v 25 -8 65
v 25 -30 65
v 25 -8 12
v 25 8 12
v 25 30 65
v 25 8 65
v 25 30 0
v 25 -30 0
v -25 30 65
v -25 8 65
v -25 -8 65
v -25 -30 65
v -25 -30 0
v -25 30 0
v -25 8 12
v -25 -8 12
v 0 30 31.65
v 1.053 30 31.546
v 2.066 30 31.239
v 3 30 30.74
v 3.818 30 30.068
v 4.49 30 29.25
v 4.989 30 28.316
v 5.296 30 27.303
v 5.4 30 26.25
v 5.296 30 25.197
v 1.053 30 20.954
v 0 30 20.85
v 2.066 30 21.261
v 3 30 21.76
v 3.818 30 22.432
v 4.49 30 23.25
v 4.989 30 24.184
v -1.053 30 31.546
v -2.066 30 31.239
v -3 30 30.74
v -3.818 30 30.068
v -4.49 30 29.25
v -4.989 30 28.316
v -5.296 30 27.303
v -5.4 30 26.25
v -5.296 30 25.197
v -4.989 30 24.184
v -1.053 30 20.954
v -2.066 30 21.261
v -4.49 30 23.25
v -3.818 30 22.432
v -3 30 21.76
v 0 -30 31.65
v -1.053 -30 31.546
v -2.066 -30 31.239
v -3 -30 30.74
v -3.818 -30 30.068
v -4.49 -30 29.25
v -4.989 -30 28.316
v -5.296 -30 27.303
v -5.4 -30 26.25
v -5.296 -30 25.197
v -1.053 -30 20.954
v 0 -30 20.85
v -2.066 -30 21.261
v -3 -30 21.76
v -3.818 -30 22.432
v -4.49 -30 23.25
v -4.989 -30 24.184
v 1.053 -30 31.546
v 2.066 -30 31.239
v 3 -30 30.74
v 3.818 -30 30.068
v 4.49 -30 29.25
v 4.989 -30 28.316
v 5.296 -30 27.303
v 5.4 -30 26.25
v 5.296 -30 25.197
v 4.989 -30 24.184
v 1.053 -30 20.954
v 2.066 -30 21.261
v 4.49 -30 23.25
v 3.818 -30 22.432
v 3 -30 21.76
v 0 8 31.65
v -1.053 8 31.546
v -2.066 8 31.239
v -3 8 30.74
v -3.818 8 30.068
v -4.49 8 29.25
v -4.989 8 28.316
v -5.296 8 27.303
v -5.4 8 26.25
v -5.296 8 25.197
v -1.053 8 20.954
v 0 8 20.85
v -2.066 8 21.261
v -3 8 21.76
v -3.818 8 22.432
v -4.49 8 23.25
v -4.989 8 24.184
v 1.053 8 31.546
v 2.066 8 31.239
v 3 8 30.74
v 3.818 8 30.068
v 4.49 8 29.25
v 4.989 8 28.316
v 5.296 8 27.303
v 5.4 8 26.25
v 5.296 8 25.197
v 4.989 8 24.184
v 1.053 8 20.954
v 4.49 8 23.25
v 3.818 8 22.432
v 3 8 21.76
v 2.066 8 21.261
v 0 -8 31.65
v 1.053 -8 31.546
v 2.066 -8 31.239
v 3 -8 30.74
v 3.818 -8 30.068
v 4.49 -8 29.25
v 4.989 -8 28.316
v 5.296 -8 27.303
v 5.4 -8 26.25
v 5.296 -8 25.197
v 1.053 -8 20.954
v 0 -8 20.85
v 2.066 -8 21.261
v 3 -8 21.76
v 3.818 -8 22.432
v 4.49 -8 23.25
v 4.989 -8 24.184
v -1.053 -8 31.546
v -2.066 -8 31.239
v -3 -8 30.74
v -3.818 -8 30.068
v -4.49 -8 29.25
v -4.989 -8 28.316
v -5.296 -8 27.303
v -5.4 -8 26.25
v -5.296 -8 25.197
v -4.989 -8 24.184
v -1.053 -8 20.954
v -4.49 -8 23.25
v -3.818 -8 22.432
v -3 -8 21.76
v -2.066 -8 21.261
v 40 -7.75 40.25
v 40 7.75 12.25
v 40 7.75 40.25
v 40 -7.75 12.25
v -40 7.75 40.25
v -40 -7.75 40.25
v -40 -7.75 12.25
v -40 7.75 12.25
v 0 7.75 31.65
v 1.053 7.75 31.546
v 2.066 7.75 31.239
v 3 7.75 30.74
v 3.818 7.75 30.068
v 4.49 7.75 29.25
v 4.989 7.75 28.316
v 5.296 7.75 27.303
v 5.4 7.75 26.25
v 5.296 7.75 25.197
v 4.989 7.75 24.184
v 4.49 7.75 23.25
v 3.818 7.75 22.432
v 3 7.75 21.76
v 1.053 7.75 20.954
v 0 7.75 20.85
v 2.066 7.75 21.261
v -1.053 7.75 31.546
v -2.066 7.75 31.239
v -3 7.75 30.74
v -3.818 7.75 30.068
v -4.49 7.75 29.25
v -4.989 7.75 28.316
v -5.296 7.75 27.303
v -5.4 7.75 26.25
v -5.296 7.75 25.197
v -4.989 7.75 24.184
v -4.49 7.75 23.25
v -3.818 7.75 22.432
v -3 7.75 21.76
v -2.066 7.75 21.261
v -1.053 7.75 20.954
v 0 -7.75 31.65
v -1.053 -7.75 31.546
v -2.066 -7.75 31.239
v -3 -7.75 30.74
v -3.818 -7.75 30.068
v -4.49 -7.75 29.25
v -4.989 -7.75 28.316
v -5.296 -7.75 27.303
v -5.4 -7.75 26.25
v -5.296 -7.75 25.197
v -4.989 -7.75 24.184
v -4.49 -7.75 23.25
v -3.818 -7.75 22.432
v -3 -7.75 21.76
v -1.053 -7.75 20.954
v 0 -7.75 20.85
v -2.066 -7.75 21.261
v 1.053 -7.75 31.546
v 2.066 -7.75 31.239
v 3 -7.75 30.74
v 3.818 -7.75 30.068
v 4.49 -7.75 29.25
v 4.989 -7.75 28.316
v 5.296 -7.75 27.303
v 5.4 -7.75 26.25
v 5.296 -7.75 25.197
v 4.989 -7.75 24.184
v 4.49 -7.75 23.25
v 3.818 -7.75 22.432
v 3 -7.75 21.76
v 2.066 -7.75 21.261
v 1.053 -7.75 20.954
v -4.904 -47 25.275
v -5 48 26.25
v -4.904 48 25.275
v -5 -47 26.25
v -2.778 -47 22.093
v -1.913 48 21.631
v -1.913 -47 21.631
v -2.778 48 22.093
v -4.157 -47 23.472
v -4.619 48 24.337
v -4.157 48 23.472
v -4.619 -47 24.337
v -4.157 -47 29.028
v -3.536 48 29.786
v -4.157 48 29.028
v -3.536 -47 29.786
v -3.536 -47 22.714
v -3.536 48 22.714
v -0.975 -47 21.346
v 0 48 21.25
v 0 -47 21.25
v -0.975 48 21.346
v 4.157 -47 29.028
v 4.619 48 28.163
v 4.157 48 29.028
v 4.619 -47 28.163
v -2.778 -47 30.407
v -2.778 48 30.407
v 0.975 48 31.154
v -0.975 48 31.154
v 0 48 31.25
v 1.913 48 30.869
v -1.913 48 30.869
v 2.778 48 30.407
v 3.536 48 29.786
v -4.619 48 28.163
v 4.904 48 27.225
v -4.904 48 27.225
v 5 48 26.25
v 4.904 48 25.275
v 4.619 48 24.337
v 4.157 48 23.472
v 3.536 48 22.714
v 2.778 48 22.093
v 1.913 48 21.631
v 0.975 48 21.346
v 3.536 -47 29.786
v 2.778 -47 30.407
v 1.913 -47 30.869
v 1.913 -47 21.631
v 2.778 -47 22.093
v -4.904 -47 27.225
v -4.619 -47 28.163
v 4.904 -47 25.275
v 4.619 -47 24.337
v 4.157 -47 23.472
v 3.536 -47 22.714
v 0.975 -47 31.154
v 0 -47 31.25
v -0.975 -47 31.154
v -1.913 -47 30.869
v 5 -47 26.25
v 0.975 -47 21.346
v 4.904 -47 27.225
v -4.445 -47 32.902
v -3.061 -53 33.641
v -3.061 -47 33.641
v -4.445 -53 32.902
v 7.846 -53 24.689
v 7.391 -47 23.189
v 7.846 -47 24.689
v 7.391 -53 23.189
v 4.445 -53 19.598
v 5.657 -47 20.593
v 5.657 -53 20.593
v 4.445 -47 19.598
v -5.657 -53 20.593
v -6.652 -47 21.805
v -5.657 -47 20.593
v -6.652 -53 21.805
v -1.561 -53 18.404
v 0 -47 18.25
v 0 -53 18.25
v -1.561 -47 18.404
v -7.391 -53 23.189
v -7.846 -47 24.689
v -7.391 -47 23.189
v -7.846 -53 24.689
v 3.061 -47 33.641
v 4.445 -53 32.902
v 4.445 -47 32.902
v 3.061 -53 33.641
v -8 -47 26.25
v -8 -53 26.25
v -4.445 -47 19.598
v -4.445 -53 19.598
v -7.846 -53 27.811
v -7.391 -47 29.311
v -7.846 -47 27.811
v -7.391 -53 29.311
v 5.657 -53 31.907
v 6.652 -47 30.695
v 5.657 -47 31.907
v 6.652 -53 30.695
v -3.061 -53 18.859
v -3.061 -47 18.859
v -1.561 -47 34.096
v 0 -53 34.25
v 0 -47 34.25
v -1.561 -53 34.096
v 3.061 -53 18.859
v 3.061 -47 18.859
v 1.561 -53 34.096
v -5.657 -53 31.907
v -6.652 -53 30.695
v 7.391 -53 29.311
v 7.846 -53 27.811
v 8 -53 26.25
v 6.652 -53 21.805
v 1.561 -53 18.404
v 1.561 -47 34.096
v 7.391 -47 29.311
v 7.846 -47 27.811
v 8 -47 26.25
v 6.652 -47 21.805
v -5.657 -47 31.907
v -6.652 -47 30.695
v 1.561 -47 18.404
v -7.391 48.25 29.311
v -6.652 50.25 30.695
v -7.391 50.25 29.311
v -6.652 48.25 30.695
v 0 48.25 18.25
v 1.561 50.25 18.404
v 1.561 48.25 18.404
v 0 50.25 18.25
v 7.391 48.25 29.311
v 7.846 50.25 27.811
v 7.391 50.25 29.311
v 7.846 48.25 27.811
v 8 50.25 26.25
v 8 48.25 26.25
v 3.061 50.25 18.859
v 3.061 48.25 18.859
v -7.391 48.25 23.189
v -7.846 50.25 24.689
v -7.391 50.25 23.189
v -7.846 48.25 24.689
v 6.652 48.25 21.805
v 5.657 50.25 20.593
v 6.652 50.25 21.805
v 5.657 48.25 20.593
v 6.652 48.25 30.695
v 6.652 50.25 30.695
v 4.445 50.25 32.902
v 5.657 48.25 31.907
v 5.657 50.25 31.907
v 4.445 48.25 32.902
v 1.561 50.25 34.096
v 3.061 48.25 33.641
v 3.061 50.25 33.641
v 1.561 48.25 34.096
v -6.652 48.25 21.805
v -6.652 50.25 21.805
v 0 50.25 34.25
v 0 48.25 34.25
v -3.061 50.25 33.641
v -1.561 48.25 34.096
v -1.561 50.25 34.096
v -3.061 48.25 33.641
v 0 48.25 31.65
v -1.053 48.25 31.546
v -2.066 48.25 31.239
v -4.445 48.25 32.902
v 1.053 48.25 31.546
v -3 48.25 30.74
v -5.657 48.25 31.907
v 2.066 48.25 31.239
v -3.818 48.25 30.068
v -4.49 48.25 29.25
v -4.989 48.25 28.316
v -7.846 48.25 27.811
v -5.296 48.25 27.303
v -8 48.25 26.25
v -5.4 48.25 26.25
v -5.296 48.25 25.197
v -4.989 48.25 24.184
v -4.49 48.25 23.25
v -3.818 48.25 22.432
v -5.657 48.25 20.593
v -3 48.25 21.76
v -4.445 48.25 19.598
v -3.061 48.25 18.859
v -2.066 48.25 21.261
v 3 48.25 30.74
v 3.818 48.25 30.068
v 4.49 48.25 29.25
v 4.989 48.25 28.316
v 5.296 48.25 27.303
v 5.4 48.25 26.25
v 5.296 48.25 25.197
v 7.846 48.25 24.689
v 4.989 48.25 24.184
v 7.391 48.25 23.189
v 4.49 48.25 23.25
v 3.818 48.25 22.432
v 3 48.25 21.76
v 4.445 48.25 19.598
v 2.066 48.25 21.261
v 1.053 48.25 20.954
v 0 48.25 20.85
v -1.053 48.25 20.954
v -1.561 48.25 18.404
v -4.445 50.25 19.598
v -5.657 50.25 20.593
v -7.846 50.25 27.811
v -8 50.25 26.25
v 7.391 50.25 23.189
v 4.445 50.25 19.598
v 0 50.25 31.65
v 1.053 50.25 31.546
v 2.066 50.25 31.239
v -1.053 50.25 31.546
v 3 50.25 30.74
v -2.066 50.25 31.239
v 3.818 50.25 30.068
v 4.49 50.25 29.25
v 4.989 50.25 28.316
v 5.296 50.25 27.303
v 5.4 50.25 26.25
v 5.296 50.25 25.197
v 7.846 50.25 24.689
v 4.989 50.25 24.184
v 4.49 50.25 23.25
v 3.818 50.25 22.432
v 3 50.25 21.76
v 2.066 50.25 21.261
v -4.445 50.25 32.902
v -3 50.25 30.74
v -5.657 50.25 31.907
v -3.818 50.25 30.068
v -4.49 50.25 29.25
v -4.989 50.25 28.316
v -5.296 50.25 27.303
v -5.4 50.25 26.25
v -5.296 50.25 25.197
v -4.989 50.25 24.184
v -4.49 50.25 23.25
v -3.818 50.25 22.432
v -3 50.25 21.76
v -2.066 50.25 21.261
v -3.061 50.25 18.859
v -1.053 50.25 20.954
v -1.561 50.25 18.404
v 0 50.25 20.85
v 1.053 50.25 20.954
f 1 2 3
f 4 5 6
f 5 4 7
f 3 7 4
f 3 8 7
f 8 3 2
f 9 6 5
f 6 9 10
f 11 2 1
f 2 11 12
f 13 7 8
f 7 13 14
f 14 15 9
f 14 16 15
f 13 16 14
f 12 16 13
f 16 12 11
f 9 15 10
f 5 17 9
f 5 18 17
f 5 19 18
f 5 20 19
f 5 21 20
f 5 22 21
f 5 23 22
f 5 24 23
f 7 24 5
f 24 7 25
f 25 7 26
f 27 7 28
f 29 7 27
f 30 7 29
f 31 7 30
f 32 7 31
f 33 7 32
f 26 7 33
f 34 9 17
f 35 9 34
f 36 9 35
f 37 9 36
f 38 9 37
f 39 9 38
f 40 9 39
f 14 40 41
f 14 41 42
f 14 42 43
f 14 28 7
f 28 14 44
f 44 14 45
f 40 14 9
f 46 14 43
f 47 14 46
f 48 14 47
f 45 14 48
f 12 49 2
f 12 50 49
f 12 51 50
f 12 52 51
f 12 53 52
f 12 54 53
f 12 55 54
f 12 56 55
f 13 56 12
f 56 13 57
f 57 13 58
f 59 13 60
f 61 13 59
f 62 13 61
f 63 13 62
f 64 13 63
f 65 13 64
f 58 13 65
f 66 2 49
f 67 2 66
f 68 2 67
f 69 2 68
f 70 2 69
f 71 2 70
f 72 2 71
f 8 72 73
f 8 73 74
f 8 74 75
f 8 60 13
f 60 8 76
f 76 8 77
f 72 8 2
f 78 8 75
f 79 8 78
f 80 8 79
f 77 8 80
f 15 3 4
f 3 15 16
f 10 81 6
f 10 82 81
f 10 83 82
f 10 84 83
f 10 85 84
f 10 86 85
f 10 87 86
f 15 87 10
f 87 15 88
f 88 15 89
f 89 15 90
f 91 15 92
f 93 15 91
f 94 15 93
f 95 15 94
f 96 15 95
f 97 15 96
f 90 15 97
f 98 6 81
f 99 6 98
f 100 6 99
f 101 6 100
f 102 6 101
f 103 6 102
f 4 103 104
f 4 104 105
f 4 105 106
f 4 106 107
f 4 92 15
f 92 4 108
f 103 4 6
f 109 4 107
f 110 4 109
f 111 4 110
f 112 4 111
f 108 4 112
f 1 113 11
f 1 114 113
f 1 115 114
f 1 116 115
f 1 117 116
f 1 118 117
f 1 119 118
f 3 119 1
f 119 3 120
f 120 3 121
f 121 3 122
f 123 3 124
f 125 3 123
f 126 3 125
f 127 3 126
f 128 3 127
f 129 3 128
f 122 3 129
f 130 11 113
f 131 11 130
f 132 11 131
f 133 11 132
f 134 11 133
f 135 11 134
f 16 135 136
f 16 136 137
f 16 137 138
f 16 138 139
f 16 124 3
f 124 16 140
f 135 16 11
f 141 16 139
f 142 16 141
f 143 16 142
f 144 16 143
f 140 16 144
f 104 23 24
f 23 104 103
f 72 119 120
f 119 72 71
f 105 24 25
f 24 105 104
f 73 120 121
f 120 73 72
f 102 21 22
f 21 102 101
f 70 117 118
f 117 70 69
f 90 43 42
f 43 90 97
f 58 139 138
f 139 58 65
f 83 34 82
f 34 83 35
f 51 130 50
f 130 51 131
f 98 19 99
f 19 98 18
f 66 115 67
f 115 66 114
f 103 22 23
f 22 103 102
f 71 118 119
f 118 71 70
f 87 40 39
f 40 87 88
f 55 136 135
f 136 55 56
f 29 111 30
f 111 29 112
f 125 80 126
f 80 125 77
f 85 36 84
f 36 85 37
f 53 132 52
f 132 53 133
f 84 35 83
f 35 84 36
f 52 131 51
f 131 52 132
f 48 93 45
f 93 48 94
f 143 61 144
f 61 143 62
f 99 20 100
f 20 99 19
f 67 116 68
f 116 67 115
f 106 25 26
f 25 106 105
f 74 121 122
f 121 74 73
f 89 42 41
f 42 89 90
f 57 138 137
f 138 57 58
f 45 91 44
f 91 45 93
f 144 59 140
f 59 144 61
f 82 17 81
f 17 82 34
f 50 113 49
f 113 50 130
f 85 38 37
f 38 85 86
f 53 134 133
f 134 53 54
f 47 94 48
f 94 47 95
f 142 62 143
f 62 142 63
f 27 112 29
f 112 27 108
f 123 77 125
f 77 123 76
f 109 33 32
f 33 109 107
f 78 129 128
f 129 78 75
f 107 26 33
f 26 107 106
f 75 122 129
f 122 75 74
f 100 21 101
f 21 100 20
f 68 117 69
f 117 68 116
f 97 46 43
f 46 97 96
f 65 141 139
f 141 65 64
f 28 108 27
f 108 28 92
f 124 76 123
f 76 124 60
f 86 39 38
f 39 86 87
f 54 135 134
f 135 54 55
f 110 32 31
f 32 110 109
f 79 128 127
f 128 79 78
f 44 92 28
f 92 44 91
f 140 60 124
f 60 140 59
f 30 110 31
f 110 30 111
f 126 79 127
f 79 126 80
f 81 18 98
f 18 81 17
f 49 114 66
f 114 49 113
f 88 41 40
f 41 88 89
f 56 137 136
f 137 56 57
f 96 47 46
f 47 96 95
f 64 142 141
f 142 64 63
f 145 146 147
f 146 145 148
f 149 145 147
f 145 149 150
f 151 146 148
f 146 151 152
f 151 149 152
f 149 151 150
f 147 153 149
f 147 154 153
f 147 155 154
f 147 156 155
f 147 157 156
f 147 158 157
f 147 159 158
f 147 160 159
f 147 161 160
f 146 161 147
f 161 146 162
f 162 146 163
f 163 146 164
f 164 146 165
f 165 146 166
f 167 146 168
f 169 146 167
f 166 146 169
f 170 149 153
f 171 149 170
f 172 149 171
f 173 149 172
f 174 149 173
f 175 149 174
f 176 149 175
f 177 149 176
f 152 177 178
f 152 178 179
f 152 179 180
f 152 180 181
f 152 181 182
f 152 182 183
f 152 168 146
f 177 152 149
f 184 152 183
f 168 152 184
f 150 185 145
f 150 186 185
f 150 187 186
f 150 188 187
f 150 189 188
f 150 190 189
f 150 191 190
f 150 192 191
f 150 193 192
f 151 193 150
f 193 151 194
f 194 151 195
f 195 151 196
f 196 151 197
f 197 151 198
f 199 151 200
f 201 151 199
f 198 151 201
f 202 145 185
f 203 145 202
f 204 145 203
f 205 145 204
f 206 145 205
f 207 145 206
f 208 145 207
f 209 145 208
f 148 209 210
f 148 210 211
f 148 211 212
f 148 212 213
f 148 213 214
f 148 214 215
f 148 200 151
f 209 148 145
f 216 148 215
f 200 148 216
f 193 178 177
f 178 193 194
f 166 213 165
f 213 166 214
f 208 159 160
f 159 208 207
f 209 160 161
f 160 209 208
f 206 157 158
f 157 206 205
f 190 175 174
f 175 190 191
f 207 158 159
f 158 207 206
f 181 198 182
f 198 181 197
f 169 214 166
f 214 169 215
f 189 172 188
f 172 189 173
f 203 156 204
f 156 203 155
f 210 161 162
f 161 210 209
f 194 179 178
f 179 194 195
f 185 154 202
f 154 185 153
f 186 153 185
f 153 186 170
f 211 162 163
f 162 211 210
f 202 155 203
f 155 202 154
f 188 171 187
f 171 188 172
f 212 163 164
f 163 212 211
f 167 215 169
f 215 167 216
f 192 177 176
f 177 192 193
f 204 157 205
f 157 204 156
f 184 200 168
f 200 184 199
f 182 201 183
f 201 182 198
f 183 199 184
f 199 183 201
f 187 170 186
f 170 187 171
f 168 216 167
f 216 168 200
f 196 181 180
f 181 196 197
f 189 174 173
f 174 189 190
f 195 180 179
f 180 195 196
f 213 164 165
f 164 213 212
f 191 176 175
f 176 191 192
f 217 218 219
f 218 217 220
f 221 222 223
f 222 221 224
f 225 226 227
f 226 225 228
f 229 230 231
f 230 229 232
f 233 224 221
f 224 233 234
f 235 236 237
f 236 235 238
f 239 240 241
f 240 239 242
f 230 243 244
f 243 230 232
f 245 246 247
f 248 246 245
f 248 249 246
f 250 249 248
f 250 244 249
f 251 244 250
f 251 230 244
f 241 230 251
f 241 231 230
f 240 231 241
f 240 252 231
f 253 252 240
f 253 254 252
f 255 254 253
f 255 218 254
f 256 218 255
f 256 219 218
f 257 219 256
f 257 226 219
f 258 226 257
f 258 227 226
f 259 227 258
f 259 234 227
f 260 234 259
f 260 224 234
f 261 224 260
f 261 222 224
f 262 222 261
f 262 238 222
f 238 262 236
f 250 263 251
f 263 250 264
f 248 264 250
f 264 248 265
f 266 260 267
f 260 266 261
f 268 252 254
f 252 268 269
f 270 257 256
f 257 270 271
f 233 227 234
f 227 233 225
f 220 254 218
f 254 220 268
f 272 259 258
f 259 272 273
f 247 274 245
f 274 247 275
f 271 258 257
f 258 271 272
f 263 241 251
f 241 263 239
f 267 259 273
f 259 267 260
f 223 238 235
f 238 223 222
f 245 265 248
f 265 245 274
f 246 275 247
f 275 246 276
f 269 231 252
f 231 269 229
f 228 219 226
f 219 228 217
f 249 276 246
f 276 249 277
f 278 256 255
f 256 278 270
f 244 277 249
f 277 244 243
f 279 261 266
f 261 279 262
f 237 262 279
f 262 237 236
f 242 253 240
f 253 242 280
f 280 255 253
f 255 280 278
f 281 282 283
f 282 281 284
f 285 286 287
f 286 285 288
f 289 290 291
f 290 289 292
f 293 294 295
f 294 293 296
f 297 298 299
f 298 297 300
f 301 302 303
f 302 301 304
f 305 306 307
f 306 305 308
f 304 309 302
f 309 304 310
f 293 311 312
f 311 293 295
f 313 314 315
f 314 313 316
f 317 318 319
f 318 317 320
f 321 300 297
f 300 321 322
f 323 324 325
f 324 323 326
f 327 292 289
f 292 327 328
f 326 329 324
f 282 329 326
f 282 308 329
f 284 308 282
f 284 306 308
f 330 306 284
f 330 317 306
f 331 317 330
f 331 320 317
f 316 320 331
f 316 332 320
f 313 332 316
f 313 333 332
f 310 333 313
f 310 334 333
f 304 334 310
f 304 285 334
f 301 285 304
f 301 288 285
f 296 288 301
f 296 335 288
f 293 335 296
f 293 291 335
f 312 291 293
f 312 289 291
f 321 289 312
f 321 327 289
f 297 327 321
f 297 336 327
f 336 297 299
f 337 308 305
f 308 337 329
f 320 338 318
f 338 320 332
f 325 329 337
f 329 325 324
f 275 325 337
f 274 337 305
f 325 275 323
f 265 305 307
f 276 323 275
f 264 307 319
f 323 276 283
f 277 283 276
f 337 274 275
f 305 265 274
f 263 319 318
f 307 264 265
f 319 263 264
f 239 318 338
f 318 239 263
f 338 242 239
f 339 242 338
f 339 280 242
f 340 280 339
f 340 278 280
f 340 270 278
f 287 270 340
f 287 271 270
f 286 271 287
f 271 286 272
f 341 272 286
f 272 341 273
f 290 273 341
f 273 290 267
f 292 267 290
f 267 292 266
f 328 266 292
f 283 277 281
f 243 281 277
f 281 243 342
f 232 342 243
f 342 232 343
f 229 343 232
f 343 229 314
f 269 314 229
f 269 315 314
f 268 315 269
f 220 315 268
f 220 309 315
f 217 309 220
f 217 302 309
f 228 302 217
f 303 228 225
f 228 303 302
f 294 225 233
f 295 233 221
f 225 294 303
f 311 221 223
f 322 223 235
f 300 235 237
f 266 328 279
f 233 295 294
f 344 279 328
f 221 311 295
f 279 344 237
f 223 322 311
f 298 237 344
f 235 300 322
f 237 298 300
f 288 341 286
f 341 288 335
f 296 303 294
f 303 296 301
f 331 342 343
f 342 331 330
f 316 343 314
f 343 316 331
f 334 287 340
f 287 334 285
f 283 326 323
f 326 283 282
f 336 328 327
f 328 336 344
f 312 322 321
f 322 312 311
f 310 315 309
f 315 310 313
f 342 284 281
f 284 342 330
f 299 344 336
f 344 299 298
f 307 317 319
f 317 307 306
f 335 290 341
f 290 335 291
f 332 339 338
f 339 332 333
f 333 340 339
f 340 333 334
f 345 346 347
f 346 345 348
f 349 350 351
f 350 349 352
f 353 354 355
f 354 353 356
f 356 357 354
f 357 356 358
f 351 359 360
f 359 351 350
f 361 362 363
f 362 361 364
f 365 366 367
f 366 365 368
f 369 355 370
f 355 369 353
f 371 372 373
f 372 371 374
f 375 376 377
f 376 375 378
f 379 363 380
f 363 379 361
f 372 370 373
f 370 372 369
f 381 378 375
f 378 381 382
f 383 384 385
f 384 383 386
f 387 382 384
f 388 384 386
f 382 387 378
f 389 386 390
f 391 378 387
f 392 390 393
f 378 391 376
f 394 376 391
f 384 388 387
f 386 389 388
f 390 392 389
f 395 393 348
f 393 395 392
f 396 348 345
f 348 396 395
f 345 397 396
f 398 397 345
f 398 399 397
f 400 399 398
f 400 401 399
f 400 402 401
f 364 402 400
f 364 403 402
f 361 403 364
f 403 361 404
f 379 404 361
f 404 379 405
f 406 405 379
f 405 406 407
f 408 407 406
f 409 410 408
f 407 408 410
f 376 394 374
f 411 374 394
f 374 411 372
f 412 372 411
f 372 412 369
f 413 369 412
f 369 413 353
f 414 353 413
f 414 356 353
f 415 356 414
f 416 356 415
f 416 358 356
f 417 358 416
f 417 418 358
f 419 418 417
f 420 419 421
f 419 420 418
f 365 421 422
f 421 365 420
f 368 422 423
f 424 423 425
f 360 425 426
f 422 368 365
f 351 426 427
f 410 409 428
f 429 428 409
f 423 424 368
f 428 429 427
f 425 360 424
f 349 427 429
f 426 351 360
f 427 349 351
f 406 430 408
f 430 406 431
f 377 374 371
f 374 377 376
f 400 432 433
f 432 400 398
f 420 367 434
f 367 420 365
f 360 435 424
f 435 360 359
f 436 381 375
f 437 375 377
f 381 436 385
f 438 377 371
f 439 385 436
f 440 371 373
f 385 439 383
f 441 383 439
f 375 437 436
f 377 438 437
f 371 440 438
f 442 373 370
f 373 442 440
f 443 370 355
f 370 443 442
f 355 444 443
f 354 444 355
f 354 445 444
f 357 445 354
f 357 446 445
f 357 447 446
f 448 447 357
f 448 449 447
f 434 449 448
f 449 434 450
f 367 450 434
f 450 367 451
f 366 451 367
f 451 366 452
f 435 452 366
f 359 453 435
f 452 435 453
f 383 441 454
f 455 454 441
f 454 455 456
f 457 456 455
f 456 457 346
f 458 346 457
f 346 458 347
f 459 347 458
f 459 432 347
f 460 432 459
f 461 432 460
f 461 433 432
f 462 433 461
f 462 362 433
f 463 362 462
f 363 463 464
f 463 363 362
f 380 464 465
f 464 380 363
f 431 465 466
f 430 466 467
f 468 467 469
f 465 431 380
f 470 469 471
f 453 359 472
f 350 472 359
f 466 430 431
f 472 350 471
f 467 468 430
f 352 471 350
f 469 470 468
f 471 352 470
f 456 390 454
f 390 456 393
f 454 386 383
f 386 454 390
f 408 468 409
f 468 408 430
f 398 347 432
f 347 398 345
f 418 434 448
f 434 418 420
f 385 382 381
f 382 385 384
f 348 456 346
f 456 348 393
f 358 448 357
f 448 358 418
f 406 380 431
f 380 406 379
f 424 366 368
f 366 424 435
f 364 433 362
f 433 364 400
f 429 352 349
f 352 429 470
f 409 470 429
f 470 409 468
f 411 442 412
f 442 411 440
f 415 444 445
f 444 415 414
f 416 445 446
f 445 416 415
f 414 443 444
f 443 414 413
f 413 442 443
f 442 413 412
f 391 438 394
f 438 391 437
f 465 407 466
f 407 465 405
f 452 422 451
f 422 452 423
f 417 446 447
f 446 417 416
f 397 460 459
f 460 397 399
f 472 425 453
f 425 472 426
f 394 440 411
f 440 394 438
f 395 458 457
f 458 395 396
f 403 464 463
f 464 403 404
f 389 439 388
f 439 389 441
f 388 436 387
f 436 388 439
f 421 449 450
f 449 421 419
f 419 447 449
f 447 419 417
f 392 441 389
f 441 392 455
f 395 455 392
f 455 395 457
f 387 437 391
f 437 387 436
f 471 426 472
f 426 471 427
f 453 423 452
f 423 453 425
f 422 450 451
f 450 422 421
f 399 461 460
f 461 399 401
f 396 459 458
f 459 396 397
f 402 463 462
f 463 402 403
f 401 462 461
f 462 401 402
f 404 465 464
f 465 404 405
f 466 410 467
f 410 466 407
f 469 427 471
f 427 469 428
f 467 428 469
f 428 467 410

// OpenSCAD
$fn = 32;

// ------------------------------------------------------------------------
// Clevis joint: 50 mm clevis, pin d10
// Every part is its own module, assembly() places them once.
// ------------------------------------------------------------------------

// --- part 1 ---
module clevis() {
  difference() {
    translate([-25, -30, 0]) cube([50, 60, 65]);
    translate([-26, -8, 12]) cube([52, 16, 54]);
    translate([0, 0, 26.25]) rotate([90, 0, 0]) cylinder(h = 62, d = 10.8, center = true);
  }
}

// --- part 2 ---
module eye() {
  difference() {
    translate([-40, -7.75, 0]) cube([80, 15.5, 28]);
    translate([0, 0, 14]) rotate([90, 0, 0]) cylinder(h = 17.5, d = 10.8, center = true);
  }
}

// --- part 3 ---
module pin() {
  rotate([0, 90, 0]) cylinder(h = 96, d = 10, center = true);
  translate([-53, 0, 0]) rotate([0, 90, 0]) cylinder(h = 6, d = 16);
}

// --- part 4 ---
module retainer() {
  difference() {
      translate([0, 0, 0]) cylinder(h = 2, d = 16);
      translate([0, 0, -1]) cylinder(h = 4, d = 10.8);
    }
}

// --- assembly ---
module assembly() {
  translate([0, 0, 0]) rotate([0, 0, 0]) clevis();
  translate([0, 0, 12.25]) rotate([0, 0, 0]) eye();
  translate([0, 0, 26.25]) rotate([0, 0, 90]) pin();
  translate([0, 50.25, 26.25]) rotate([90, 0, 0]) retainer();
}

assembly();
